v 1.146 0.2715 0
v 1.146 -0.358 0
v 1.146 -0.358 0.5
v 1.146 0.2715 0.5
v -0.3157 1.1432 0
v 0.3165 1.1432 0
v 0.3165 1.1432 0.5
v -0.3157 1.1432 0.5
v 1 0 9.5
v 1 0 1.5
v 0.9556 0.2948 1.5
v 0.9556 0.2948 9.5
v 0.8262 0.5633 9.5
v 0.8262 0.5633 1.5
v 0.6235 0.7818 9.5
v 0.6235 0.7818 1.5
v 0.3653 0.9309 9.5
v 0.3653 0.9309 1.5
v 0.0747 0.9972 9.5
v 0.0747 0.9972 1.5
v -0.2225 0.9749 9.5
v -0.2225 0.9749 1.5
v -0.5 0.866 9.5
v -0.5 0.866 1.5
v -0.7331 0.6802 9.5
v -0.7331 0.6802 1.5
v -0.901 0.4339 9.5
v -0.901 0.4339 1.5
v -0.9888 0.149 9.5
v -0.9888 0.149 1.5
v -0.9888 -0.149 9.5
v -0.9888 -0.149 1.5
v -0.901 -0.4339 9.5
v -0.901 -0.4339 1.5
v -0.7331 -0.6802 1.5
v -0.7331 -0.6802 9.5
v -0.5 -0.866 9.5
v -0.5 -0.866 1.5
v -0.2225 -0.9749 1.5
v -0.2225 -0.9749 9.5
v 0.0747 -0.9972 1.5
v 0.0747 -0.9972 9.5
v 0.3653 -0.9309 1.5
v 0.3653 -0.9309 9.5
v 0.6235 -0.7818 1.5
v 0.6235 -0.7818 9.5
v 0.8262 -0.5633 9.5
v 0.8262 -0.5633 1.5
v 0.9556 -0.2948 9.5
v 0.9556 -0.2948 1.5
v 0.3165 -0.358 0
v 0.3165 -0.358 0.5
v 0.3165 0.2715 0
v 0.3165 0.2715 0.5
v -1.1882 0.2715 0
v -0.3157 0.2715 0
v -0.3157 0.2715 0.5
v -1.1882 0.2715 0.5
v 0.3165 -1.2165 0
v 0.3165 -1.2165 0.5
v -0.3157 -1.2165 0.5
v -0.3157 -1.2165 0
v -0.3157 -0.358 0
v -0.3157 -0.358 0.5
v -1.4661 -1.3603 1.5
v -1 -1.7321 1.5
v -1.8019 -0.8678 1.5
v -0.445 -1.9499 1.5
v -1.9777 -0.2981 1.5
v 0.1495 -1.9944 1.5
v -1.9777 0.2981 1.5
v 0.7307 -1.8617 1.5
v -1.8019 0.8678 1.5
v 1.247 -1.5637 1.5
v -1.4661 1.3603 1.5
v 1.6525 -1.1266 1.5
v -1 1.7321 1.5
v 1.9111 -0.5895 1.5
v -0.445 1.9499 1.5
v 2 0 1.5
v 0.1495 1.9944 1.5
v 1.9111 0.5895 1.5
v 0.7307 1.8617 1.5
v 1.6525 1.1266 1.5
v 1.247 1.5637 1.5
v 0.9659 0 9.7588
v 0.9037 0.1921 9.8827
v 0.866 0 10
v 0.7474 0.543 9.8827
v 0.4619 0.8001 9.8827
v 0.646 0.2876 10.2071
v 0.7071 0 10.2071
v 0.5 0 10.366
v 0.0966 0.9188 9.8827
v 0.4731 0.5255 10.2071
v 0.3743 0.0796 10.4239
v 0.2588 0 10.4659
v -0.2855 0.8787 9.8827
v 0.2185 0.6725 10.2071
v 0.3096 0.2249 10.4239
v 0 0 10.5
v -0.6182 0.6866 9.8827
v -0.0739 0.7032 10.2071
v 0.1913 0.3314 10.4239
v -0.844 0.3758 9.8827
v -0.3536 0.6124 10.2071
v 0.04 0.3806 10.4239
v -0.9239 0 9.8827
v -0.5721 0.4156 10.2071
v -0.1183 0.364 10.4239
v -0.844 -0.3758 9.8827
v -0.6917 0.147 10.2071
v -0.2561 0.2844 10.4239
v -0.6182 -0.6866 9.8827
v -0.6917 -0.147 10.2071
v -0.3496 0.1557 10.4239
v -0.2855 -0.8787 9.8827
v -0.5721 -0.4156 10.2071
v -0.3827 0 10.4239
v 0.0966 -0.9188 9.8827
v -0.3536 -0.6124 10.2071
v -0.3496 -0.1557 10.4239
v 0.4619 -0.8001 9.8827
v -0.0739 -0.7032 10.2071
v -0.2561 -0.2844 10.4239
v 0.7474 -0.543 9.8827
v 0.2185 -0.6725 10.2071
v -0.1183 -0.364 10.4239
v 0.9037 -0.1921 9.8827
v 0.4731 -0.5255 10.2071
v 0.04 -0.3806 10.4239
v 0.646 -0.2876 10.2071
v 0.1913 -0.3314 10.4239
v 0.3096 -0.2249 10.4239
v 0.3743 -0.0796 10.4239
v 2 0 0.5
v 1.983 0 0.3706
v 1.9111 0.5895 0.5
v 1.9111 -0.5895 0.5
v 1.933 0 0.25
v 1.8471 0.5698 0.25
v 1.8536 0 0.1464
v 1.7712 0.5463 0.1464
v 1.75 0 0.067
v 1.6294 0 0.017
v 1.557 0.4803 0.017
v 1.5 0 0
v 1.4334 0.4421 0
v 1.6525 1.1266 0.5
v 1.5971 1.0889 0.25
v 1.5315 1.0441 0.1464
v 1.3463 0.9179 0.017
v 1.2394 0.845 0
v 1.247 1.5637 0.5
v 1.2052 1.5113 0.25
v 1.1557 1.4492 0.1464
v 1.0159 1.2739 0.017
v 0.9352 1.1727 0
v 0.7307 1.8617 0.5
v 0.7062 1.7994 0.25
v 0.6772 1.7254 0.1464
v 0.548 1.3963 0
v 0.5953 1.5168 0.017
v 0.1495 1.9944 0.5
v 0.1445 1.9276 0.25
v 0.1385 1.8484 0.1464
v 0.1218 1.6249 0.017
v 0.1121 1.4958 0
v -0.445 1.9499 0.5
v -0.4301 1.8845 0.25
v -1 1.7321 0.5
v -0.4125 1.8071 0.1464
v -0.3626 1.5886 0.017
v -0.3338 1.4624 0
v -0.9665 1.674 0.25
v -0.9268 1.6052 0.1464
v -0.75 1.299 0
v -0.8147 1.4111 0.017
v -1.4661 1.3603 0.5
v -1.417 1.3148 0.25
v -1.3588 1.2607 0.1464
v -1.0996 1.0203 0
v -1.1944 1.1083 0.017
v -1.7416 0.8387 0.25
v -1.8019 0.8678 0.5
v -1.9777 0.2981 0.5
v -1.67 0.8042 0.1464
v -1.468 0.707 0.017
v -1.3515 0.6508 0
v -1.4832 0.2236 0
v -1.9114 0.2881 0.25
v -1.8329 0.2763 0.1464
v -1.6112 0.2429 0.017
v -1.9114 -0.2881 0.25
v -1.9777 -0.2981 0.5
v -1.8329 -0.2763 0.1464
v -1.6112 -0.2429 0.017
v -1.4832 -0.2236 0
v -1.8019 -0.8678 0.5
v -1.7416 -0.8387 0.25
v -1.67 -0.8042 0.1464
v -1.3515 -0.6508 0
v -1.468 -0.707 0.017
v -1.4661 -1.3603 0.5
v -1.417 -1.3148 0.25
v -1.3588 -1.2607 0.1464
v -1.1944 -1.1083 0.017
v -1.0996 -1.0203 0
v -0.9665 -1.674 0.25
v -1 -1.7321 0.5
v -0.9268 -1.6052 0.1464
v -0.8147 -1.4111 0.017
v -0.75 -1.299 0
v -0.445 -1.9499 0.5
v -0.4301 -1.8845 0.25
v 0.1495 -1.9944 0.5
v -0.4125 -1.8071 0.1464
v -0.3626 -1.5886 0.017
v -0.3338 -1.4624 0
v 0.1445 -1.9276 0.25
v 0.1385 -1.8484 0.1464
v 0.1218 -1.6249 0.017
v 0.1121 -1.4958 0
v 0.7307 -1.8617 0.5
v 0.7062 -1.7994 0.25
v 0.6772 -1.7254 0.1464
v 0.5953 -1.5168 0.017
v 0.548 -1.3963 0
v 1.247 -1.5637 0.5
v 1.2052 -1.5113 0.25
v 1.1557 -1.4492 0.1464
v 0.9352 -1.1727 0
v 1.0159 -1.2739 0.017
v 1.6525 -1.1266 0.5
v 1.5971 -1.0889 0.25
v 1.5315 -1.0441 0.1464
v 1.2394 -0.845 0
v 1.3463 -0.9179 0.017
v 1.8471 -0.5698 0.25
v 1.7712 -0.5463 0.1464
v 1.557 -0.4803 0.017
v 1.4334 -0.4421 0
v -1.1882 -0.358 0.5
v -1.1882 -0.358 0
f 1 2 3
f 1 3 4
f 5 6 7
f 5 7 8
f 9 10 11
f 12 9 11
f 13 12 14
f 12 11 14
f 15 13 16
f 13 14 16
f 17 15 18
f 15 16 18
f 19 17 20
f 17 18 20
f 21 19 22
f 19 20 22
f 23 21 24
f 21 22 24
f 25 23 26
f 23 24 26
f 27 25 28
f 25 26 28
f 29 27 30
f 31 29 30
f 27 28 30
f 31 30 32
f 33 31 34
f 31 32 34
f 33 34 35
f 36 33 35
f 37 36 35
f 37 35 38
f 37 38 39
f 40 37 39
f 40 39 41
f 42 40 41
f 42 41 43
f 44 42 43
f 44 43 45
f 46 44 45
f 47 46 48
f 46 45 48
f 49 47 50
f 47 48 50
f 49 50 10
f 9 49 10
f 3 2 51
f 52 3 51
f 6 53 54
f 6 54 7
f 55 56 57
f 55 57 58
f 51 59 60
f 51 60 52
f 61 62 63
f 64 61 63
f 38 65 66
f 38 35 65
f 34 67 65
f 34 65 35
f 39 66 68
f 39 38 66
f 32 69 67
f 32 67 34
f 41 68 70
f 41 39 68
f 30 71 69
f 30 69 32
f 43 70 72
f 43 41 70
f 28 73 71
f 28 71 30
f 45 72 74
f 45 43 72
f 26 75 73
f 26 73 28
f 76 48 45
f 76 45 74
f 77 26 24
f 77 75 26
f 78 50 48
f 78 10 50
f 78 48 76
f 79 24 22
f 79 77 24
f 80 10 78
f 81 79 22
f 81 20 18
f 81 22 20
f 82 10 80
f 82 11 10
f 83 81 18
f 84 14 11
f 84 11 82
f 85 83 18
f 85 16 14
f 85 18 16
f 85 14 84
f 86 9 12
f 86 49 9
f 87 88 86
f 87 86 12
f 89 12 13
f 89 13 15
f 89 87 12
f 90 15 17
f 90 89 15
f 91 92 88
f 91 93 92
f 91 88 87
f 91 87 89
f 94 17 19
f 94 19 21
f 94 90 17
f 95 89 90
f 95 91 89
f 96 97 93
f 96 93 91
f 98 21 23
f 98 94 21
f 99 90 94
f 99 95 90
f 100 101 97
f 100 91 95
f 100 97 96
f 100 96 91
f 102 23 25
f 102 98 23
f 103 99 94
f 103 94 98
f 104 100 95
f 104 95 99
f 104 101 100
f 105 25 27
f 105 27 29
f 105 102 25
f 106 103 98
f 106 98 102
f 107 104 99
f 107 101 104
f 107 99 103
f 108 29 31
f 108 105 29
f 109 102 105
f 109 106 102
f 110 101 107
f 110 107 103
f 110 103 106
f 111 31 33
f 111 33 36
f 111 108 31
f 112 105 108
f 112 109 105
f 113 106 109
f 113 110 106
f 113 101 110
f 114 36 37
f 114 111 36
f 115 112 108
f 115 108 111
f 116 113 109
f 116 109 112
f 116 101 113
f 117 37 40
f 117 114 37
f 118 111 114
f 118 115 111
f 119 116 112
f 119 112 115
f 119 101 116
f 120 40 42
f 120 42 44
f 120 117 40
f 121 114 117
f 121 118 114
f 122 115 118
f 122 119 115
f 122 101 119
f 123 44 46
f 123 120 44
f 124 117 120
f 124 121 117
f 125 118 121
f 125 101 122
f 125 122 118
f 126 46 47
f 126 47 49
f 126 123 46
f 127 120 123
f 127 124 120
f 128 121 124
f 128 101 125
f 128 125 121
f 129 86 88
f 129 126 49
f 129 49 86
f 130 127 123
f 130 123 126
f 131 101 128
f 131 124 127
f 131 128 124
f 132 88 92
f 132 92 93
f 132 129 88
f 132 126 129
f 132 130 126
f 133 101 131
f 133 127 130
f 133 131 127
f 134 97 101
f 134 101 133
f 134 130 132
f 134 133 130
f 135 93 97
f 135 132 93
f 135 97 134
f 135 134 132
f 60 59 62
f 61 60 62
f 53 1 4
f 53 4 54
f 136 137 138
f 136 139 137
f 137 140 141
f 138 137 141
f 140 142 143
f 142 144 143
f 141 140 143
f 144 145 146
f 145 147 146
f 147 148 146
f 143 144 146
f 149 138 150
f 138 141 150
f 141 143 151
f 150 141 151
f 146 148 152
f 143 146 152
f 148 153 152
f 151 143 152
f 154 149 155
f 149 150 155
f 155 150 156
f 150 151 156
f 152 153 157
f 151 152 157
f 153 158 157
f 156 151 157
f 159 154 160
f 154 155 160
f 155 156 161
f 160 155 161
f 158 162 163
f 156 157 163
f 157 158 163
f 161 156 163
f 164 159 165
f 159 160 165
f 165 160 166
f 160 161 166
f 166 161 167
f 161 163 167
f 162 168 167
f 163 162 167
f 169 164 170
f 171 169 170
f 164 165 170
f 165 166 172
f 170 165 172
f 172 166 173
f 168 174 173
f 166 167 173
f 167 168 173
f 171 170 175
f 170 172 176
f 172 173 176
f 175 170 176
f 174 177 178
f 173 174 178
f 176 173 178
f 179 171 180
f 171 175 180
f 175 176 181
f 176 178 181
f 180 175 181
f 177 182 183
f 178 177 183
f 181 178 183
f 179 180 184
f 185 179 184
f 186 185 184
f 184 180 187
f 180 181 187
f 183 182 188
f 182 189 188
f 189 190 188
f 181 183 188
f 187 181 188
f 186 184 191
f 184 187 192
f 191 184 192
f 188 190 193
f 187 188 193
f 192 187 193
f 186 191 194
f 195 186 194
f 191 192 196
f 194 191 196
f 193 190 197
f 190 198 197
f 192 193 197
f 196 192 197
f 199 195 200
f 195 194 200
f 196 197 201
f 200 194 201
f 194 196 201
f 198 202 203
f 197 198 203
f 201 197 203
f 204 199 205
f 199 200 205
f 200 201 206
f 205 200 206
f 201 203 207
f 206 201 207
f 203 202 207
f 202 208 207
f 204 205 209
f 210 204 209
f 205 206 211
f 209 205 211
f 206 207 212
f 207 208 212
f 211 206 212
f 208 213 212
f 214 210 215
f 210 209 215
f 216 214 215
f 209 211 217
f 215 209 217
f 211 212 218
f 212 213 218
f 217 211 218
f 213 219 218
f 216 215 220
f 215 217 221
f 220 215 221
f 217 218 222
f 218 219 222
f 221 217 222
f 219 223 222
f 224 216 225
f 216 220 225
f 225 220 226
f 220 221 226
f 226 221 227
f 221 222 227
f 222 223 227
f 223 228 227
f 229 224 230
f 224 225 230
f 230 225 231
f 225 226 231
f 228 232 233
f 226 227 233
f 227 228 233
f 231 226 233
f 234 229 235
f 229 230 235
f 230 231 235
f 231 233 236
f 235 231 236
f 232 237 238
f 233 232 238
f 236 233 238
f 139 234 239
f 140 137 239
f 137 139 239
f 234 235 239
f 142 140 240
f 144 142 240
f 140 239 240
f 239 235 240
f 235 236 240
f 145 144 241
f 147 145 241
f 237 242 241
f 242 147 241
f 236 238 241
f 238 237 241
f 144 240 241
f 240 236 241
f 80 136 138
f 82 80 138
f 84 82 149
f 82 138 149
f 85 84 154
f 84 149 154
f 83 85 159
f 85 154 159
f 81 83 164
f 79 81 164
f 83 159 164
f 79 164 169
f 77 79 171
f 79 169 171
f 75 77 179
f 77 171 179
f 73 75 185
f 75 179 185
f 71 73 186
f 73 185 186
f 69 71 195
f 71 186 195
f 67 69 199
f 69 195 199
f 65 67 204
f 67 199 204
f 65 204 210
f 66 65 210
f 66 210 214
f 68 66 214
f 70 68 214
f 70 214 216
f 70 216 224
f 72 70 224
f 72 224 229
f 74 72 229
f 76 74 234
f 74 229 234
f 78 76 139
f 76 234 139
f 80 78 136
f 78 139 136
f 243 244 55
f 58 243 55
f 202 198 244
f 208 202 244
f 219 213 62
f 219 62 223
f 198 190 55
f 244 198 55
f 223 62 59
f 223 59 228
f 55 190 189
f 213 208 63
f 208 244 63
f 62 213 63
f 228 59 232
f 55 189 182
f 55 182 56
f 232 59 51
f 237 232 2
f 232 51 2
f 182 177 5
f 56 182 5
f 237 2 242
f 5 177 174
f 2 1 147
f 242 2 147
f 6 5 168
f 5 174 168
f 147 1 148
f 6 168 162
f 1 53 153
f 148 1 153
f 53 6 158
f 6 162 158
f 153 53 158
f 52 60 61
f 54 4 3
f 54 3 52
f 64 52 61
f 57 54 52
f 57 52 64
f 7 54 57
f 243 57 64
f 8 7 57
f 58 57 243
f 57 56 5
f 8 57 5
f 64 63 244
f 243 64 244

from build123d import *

# Parameters (mm, degrees)
SKIZZE1_R                       = 2
AUFSATZ_LINEAR_AUSTRAGEN1_DEPTH = 1.5
SKIZZE2_R                       = 1
AUFSATZ_LINEAR_AUSTRAGEN2_DEPTH = 9
VERRUNDUNG1_R                   = 1
VERRUNDUNG2_R                   = 0.5
SKIZZE3_W                       = 0.829527345
SKIZZE3_H                       = 0.629507901
SKIZZE3_W_2                     = 0.632202029
SKIZZE3_H_2                     = 0.871689933
SKIZZE3_W_3                     = 0.872489972
SKIZZE3_H_3                     = 0.858509012
SCHNITT_LINEAR_AUSTRAGEN1_DEPTH = 0.5


with BuildPart() as part:
    # Skizze1 → Aufsatz-Linear austragen1 (new body)
    with BuildSketch(Plane.XY):
        Circle(SKIZZE1_R)
    extrude(amount=AUFSATZ_LINEAR_AUSTRAGEN1_DEPTH)

    # Skizze2 → Aufsatz-Linear austragen2 (add)
    with BuildSketch(Plane.XY.offset(1.5)):
        Circle(SKIZZE2_R)
    extrude(amount=AUFSATZ_LINEAR_AUSTRAGEN2_DEPTH)

    # Verrundung1
    verrundung1_edges = [part.edges().sort_by_distance(p)[0] for p in [
        (-1, 0, 10.5),
    ]]
    fillet(verrundung1_edges, radius=VERRUNDUNG1_R)

    # Verrundung2
    verrundung2_edges = [part.edges().sort_by_distance(p)[0] for p in [
        (-2, 0, 0),
    ]]
    fillet(verrundung2_edges, radius=VERRUNDUNG2_R)

    # Skizze3 → Schnitt-Linear austragen1 (cut)
    with BuildSketch(Plane(origin=(0, 0, 0), x_dir=(-1, 0, 0), z_dir=(0, 0, -1))):
        with Locations((-0.731284278, -0.043253269)):
            Rectangle(SKIZZE3_W, SKIZZE3_H)
        with Locations((-0.00041959, 0.707345648)):
            Rectangle(SKIZZE3_W_2, SKIZZE3_H_2)
        with Locations((0.75192641, -0.043253269)):
            Rectangle(SKIZZE3_W_3, SKIZZE3_H)
        with Locations((-0.00041959, -0.787261726)):
            Rectangle(SKIZZE3_W_2, SKIZZE3_H_3)
        with Locations((-0.00041959, -0.043253269)):
            Rectangle(SKIZZE3_W_2, SKIZZE3_H)
    extrude(amount=-SCHNITT_LINEAR_AUSTRAGEN1_DEPTH, mode=Mode.SUBTRACT)


solid = part.part
